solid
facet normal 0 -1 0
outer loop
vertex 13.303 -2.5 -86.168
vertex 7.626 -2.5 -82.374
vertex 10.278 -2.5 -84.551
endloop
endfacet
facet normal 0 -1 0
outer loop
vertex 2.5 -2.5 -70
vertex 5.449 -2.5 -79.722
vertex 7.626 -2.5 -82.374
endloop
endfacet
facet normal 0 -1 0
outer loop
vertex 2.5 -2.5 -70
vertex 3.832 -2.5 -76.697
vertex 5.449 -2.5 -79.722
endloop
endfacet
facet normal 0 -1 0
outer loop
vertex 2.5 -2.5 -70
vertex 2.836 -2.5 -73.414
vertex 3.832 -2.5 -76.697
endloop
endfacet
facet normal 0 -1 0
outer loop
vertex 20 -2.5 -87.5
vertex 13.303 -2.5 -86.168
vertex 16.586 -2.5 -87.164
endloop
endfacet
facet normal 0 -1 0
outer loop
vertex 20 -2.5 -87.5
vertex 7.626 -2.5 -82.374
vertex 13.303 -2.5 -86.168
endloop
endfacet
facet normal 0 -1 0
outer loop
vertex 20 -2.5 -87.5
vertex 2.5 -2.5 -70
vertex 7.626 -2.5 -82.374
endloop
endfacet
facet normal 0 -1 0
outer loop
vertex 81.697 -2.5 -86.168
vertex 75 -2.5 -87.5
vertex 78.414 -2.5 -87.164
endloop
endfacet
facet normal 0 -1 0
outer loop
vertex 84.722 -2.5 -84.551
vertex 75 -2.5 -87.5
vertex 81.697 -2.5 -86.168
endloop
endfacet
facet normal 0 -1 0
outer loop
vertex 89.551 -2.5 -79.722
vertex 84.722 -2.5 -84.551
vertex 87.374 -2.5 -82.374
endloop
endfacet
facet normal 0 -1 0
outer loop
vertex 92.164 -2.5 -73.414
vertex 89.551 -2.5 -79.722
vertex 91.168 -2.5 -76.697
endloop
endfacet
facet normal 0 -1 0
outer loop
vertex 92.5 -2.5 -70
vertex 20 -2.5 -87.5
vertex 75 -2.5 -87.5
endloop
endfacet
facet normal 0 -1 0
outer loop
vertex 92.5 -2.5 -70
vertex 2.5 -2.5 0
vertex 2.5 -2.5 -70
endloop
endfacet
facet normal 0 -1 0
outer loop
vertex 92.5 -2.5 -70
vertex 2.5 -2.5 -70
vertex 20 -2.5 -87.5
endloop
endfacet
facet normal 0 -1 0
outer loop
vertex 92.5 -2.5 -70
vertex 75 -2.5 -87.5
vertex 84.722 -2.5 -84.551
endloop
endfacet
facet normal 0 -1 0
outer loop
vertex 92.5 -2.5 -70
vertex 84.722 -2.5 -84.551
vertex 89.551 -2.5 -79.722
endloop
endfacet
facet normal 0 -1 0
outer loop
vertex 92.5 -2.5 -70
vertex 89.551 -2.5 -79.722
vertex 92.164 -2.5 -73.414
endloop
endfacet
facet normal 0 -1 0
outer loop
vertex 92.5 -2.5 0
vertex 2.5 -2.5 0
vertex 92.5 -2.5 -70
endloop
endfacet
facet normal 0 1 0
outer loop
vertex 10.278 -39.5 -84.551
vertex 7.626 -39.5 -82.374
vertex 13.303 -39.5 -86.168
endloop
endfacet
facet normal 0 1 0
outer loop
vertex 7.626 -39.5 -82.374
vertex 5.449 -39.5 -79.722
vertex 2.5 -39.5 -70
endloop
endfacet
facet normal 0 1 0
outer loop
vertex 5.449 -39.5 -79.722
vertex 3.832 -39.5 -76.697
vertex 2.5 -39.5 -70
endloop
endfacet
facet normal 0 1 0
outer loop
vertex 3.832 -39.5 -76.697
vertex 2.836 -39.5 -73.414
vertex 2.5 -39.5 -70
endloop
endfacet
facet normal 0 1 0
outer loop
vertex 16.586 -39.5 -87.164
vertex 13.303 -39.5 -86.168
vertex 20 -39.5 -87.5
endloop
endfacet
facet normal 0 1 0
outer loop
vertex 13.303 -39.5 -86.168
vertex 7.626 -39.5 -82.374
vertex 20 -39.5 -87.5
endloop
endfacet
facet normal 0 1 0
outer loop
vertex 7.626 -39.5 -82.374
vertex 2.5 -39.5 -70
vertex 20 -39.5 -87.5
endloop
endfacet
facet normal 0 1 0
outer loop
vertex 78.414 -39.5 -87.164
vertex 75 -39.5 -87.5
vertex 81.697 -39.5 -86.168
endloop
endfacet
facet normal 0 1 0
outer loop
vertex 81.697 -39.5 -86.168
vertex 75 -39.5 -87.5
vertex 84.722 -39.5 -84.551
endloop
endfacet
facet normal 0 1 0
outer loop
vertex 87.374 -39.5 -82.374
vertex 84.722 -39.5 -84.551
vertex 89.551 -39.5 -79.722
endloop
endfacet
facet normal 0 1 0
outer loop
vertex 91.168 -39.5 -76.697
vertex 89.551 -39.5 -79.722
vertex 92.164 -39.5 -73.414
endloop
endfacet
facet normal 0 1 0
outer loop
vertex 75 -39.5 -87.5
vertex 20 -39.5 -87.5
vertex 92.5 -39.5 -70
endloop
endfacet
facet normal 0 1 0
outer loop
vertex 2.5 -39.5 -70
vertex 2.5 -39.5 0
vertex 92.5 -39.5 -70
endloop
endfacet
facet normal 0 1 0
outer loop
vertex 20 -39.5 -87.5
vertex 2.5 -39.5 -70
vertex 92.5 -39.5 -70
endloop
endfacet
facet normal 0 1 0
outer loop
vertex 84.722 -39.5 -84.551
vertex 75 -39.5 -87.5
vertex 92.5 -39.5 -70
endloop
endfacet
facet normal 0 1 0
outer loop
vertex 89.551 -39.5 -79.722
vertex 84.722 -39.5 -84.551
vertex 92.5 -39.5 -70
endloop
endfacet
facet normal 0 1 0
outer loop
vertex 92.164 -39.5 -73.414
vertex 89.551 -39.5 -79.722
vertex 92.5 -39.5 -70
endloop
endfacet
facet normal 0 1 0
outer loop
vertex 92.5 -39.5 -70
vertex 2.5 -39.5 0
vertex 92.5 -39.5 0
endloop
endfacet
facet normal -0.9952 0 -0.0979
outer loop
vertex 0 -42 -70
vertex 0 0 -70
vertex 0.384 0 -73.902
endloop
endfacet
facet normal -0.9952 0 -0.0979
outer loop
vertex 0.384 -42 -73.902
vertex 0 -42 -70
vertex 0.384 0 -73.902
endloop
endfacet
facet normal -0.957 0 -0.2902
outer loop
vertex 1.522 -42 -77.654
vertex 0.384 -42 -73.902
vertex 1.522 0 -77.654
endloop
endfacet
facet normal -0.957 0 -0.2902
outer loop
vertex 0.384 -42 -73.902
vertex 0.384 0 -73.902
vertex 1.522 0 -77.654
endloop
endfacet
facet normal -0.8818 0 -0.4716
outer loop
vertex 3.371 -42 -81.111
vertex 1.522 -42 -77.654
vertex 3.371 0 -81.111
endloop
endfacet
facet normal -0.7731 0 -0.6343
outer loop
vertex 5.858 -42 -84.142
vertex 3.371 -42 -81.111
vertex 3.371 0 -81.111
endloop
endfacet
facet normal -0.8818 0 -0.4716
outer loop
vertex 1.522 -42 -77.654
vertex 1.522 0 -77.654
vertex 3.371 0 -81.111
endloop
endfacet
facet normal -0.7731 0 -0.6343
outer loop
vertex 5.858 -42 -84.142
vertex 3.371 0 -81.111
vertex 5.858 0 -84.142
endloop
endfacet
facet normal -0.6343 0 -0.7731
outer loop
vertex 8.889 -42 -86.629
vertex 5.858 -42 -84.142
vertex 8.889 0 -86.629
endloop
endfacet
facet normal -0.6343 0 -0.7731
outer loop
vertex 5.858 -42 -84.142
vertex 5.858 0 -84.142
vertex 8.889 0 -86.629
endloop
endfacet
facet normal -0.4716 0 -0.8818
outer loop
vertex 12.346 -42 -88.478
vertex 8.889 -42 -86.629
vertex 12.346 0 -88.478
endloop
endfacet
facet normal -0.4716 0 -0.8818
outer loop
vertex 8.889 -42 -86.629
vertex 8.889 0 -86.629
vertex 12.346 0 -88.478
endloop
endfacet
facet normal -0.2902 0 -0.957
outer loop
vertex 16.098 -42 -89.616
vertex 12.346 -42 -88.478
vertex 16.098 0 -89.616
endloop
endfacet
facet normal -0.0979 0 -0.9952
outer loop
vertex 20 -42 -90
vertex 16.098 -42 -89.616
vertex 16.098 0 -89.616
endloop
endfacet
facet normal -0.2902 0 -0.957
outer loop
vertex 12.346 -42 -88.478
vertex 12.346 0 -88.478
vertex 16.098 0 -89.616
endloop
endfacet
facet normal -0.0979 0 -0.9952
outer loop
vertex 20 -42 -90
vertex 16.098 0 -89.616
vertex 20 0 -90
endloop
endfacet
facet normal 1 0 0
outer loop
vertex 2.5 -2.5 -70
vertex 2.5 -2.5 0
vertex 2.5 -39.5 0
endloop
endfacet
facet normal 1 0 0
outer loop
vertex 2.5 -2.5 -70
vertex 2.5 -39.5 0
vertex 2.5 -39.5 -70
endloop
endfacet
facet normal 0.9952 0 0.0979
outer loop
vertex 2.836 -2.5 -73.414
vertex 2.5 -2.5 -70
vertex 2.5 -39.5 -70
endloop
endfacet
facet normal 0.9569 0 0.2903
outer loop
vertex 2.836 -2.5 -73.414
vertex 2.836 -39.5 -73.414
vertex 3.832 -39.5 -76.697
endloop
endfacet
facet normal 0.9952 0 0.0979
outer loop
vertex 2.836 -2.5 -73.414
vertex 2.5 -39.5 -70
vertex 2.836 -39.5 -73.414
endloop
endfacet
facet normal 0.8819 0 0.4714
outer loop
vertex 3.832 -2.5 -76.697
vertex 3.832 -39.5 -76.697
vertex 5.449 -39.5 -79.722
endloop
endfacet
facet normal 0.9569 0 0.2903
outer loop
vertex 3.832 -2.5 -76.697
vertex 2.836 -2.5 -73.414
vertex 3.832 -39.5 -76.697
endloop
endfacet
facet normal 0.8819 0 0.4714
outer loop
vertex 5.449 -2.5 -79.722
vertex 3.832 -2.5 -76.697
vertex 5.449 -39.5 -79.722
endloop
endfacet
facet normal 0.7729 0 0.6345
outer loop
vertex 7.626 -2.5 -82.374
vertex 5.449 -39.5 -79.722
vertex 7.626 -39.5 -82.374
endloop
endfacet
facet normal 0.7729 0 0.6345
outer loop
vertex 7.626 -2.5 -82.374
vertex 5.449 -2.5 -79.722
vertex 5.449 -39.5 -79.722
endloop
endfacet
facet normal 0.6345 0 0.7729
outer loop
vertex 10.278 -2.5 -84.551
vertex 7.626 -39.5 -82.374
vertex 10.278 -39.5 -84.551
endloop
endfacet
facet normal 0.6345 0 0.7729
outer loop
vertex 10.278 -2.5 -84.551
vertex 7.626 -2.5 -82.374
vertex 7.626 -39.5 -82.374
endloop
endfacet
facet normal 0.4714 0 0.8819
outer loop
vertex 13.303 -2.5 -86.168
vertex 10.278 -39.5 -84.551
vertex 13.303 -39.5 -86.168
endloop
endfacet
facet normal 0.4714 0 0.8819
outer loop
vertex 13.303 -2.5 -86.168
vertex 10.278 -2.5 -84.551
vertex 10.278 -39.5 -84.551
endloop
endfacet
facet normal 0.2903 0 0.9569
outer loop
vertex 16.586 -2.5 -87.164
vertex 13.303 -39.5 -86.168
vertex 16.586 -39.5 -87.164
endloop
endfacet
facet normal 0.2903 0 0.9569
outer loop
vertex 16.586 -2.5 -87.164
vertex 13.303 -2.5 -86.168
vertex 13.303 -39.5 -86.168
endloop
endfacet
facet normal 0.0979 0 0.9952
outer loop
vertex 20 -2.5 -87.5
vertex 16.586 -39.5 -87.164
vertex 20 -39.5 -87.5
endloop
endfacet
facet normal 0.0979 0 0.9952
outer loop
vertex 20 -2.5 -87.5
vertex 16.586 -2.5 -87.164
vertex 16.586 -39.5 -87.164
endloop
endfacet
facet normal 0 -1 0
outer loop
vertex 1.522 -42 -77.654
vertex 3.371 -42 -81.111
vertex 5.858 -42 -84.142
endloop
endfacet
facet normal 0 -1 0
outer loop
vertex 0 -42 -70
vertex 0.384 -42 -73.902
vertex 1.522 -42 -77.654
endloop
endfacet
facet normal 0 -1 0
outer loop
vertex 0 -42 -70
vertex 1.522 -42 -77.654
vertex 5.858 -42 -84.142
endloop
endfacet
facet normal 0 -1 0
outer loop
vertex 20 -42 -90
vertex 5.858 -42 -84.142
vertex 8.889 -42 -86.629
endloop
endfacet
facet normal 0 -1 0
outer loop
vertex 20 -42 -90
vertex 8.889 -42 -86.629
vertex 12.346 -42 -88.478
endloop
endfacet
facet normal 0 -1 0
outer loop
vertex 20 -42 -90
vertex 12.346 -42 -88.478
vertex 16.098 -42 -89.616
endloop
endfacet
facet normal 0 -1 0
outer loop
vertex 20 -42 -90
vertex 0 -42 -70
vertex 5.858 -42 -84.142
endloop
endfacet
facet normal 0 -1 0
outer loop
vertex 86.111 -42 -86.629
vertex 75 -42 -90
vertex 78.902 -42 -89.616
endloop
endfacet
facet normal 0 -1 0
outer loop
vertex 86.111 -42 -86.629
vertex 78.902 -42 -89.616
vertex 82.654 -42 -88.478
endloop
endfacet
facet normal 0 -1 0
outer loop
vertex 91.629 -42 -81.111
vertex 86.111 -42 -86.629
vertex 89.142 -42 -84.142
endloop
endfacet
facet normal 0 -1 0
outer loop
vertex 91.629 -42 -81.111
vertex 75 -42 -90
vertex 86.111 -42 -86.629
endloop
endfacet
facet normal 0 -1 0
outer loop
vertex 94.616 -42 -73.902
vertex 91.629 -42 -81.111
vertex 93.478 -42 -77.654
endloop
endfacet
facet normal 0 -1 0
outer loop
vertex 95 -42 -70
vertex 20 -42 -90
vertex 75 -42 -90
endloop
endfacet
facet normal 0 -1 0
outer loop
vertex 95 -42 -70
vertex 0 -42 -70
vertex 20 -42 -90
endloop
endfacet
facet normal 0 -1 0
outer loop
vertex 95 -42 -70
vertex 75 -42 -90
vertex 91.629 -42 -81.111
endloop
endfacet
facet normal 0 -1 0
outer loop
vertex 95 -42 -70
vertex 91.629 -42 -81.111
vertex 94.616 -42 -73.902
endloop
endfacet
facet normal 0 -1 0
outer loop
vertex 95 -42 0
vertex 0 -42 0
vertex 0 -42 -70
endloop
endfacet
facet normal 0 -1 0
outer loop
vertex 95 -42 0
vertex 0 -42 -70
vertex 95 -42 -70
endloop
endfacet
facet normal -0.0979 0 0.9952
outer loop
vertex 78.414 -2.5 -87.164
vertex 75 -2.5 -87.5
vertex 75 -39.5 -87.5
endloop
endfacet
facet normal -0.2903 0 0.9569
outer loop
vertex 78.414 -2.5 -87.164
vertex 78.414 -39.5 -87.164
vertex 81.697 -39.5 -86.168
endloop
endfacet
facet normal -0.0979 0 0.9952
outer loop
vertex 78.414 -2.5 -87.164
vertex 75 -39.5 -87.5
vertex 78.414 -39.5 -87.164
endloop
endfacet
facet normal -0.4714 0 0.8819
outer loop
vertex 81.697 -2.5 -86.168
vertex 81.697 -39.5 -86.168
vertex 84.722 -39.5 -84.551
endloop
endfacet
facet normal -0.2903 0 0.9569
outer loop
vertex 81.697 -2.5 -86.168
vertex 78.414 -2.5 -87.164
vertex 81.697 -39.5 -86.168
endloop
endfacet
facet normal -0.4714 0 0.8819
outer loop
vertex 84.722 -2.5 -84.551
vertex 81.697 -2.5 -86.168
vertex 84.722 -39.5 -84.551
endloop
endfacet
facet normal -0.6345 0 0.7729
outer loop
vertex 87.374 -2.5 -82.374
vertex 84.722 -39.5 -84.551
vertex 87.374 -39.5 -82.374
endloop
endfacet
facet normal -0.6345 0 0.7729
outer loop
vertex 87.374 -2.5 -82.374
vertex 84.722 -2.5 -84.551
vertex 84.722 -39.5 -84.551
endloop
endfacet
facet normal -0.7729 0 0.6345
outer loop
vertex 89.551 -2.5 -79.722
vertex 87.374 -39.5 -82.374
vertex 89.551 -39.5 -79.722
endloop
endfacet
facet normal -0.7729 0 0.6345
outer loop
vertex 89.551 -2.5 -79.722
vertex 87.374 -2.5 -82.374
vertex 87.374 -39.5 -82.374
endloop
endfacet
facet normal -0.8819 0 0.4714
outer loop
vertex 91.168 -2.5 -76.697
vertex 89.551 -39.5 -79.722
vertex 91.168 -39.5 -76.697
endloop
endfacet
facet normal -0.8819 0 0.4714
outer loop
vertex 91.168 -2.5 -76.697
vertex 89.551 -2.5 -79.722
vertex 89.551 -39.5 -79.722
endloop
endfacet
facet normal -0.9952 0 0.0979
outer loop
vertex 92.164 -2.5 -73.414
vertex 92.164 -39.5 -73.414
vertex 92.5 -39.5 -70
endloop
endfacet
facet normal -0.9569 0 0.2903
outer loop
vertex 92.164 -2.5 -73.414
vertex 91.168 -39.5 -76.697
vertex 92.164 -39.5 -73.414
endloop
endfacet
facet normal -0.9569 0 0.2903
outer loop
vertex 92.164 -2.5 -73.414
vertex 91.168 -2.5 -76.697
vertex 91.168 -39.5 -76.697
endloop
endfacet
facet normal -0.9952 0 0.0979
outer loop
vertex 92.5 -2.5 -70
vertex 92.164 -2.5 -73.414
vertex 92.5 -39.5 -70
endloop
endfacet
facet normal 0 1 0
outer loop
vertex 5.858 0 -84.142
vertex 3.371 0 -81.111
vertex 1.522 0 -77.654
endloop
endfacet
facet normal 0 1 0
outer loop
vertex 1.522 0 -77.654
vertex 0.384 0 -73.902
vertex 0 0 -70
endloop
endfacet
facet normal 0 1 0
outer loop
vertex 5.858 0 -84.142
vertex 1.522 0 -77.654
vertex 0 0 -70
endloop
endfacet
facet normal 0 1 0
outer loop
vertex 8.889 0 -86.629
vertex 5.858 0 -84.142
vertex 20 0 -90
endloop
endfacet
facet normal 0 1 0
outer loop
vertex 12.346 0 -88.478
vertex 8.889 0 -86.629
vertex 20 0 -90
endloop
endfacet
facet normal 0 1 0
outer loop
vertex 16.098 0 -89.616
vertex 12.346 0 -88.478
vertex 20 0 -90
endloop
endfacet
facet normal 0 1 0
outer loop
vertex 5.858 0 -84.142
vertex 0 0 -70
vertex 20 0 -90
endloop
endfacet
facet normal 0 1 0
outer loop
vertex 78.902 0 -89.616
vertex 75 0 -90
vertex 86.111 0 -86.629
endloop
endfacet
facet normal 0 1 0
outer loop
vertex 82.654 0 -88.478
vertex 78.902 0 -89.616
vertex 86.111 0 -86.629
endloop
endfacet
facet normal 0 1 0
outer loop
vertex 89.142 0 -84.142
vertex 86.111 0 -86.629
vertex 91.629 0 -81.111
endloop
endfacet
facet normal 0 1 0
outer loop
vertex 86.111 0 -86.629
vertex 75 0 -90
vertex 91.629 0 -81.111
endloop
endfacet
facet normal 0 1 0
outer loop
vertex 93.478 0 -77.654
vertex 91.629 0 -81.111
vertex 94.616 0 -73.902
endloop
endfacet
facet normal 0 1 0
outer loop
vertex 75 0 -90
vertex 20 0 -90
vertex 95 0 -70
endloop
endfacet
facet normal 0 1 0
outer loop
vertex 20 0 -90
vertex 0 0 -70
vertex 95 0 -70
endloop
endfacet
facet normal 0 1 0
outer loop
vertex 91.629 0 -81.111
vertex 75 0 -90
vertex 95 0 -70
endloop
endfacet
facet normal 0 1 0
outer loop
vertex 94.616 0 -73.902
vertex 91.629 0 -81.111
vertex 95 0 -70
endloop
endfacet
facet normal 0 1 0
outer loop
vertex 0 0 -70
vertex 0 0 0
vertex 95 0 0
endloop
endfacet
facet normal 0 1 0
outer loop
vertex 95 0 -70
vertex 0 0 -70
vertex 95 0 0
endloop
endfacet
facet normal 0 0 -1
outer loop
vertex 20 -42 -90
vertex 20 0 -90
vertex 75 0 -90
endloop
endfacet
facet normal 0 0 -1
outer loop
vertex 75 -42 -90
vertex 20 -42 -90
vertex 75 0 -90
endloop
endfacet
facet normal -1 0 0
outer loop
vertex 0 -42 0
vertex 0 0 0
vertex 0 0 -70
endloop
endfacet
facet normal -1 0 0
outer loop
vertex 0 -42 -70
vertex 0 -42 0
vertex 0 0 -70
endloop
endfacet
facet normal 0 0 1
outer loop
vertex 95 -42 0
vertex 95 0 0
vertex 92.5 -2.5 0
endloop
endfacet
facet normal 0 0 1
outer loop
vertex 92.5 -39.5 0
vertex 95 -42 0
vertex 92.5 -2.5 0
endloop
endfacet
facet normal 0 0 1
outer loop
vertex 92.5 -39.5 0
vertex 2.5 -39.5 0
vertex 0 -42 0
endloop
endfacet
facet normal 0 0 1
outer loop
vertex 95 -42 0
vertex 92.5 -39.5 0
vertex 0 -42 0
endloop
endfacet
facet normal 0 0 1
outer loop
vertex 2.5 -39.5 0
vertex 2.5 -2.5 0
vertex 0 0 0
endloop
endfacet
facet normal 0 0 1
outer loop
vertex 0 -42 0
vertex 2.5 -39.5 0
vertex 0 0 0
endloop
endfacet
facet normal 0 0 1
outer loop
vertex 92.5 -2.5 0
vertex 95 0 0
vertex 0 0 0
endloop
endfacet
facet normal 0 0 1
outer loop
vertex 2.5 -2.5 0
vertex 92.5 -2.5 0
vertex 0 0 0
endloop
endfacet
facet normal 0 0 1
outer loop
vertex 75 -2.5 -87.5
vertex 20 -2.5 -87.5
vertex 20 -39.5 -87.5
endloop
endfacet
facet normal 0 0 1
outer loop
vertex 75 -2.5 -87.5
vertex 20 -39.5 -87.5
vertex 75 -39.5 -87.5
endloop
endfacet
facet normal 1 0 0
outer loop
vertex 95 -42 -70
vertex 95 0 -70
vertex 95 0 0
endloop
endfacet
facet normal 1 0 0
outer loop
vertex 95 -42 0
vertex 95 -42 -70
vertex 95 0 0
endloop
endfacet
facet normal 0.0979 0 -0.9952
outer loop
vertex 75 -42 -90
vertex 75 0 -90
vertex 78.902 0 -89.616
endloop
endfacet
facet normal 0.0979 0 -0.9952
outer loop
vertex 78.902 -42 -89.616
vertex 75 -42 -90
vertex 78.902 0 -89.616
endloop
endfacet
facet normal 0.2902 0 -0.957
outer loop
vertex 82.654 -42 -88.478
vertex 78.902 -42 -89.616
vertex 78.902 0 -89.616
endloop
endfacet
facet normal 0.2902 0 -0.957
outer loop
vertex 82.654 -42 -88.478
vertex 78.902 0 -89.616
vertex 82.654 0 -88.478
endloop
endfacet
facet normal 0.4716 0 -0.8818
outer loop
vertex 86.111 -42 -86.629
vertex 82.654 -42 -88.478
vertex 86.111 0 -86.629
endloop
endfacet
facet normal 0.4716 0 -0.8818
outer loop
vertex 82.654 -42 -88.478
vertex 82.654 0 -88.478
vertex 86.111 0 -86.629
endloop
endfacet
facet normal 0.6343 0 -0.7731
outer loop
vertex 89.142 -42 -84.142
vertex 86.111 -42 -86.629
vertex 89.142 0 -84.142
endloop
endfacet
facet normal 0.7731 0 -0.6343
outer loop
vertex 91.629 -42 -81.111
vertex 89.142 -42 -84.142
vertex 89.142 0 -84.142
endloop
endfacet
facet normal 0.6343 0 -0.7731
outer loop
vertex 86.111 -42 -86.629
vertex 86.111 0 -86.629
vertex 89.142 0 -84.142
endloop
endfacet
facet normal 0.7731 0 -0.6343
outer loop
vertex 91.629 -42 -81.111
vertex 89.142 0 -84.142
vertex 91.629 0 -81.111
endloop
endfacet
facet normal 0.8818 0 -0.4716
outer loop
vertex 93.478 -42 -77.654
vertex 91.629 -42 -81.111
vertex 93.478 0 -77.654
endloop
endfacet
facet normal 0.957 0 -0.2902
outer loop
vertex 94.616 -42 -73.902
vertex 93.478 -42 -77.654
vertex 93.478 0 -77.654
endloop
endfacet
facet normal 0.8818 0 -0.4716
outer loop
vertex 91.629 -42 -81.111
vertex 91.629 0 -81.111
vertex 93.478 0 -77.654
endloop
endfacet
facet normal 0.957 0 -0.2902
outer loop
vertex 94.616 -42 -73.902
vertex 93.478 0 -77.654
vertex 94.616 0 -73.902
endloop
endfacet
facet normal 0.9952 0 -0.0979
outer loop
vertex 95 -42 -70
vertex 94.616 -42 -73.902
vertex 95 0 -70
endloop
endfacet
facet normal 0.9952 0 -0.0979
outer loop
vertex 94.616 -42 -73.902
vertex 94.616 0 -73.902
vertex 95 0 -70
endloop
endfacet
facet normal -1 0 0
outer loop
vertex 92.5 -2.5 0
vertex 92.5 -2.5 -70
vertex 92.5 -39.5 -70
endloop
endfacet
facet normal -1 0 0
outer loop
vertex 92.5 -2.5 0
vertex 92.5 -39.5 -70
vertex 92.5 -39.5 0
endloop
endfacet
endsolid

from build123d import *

# Parameters (mm, degrees)
F1_DEPTH = 42
F2_T     = -2.5


with BuildPart() as f1:
    # F0 (on Front) → F1 (new body)
    with BuildSketch(Plane.XZ):
        with BuildLine():
            Line((95, 0), (0, 0))
            Line((0, 0), (0, -70))
            ThreePointArc((0, -70), (5.857864, -84.142136), (20, -90))
            Line((20, -90), (75, -90))
            ThreePointArc((75, -90), (89.142136, -84.142136), (95, -70))
            Line((95, -70), (95, 0))
        make_face()
    extrude(amount=F1_DEPTH)

    # F2
    f2_openings = [f1.faces().sort_by_distance(p)[0] for p in [
        (47.5, -21, 0),
    ]]
    offset(amount=F2_T, openings=f2_openings)


solid = f1.part
